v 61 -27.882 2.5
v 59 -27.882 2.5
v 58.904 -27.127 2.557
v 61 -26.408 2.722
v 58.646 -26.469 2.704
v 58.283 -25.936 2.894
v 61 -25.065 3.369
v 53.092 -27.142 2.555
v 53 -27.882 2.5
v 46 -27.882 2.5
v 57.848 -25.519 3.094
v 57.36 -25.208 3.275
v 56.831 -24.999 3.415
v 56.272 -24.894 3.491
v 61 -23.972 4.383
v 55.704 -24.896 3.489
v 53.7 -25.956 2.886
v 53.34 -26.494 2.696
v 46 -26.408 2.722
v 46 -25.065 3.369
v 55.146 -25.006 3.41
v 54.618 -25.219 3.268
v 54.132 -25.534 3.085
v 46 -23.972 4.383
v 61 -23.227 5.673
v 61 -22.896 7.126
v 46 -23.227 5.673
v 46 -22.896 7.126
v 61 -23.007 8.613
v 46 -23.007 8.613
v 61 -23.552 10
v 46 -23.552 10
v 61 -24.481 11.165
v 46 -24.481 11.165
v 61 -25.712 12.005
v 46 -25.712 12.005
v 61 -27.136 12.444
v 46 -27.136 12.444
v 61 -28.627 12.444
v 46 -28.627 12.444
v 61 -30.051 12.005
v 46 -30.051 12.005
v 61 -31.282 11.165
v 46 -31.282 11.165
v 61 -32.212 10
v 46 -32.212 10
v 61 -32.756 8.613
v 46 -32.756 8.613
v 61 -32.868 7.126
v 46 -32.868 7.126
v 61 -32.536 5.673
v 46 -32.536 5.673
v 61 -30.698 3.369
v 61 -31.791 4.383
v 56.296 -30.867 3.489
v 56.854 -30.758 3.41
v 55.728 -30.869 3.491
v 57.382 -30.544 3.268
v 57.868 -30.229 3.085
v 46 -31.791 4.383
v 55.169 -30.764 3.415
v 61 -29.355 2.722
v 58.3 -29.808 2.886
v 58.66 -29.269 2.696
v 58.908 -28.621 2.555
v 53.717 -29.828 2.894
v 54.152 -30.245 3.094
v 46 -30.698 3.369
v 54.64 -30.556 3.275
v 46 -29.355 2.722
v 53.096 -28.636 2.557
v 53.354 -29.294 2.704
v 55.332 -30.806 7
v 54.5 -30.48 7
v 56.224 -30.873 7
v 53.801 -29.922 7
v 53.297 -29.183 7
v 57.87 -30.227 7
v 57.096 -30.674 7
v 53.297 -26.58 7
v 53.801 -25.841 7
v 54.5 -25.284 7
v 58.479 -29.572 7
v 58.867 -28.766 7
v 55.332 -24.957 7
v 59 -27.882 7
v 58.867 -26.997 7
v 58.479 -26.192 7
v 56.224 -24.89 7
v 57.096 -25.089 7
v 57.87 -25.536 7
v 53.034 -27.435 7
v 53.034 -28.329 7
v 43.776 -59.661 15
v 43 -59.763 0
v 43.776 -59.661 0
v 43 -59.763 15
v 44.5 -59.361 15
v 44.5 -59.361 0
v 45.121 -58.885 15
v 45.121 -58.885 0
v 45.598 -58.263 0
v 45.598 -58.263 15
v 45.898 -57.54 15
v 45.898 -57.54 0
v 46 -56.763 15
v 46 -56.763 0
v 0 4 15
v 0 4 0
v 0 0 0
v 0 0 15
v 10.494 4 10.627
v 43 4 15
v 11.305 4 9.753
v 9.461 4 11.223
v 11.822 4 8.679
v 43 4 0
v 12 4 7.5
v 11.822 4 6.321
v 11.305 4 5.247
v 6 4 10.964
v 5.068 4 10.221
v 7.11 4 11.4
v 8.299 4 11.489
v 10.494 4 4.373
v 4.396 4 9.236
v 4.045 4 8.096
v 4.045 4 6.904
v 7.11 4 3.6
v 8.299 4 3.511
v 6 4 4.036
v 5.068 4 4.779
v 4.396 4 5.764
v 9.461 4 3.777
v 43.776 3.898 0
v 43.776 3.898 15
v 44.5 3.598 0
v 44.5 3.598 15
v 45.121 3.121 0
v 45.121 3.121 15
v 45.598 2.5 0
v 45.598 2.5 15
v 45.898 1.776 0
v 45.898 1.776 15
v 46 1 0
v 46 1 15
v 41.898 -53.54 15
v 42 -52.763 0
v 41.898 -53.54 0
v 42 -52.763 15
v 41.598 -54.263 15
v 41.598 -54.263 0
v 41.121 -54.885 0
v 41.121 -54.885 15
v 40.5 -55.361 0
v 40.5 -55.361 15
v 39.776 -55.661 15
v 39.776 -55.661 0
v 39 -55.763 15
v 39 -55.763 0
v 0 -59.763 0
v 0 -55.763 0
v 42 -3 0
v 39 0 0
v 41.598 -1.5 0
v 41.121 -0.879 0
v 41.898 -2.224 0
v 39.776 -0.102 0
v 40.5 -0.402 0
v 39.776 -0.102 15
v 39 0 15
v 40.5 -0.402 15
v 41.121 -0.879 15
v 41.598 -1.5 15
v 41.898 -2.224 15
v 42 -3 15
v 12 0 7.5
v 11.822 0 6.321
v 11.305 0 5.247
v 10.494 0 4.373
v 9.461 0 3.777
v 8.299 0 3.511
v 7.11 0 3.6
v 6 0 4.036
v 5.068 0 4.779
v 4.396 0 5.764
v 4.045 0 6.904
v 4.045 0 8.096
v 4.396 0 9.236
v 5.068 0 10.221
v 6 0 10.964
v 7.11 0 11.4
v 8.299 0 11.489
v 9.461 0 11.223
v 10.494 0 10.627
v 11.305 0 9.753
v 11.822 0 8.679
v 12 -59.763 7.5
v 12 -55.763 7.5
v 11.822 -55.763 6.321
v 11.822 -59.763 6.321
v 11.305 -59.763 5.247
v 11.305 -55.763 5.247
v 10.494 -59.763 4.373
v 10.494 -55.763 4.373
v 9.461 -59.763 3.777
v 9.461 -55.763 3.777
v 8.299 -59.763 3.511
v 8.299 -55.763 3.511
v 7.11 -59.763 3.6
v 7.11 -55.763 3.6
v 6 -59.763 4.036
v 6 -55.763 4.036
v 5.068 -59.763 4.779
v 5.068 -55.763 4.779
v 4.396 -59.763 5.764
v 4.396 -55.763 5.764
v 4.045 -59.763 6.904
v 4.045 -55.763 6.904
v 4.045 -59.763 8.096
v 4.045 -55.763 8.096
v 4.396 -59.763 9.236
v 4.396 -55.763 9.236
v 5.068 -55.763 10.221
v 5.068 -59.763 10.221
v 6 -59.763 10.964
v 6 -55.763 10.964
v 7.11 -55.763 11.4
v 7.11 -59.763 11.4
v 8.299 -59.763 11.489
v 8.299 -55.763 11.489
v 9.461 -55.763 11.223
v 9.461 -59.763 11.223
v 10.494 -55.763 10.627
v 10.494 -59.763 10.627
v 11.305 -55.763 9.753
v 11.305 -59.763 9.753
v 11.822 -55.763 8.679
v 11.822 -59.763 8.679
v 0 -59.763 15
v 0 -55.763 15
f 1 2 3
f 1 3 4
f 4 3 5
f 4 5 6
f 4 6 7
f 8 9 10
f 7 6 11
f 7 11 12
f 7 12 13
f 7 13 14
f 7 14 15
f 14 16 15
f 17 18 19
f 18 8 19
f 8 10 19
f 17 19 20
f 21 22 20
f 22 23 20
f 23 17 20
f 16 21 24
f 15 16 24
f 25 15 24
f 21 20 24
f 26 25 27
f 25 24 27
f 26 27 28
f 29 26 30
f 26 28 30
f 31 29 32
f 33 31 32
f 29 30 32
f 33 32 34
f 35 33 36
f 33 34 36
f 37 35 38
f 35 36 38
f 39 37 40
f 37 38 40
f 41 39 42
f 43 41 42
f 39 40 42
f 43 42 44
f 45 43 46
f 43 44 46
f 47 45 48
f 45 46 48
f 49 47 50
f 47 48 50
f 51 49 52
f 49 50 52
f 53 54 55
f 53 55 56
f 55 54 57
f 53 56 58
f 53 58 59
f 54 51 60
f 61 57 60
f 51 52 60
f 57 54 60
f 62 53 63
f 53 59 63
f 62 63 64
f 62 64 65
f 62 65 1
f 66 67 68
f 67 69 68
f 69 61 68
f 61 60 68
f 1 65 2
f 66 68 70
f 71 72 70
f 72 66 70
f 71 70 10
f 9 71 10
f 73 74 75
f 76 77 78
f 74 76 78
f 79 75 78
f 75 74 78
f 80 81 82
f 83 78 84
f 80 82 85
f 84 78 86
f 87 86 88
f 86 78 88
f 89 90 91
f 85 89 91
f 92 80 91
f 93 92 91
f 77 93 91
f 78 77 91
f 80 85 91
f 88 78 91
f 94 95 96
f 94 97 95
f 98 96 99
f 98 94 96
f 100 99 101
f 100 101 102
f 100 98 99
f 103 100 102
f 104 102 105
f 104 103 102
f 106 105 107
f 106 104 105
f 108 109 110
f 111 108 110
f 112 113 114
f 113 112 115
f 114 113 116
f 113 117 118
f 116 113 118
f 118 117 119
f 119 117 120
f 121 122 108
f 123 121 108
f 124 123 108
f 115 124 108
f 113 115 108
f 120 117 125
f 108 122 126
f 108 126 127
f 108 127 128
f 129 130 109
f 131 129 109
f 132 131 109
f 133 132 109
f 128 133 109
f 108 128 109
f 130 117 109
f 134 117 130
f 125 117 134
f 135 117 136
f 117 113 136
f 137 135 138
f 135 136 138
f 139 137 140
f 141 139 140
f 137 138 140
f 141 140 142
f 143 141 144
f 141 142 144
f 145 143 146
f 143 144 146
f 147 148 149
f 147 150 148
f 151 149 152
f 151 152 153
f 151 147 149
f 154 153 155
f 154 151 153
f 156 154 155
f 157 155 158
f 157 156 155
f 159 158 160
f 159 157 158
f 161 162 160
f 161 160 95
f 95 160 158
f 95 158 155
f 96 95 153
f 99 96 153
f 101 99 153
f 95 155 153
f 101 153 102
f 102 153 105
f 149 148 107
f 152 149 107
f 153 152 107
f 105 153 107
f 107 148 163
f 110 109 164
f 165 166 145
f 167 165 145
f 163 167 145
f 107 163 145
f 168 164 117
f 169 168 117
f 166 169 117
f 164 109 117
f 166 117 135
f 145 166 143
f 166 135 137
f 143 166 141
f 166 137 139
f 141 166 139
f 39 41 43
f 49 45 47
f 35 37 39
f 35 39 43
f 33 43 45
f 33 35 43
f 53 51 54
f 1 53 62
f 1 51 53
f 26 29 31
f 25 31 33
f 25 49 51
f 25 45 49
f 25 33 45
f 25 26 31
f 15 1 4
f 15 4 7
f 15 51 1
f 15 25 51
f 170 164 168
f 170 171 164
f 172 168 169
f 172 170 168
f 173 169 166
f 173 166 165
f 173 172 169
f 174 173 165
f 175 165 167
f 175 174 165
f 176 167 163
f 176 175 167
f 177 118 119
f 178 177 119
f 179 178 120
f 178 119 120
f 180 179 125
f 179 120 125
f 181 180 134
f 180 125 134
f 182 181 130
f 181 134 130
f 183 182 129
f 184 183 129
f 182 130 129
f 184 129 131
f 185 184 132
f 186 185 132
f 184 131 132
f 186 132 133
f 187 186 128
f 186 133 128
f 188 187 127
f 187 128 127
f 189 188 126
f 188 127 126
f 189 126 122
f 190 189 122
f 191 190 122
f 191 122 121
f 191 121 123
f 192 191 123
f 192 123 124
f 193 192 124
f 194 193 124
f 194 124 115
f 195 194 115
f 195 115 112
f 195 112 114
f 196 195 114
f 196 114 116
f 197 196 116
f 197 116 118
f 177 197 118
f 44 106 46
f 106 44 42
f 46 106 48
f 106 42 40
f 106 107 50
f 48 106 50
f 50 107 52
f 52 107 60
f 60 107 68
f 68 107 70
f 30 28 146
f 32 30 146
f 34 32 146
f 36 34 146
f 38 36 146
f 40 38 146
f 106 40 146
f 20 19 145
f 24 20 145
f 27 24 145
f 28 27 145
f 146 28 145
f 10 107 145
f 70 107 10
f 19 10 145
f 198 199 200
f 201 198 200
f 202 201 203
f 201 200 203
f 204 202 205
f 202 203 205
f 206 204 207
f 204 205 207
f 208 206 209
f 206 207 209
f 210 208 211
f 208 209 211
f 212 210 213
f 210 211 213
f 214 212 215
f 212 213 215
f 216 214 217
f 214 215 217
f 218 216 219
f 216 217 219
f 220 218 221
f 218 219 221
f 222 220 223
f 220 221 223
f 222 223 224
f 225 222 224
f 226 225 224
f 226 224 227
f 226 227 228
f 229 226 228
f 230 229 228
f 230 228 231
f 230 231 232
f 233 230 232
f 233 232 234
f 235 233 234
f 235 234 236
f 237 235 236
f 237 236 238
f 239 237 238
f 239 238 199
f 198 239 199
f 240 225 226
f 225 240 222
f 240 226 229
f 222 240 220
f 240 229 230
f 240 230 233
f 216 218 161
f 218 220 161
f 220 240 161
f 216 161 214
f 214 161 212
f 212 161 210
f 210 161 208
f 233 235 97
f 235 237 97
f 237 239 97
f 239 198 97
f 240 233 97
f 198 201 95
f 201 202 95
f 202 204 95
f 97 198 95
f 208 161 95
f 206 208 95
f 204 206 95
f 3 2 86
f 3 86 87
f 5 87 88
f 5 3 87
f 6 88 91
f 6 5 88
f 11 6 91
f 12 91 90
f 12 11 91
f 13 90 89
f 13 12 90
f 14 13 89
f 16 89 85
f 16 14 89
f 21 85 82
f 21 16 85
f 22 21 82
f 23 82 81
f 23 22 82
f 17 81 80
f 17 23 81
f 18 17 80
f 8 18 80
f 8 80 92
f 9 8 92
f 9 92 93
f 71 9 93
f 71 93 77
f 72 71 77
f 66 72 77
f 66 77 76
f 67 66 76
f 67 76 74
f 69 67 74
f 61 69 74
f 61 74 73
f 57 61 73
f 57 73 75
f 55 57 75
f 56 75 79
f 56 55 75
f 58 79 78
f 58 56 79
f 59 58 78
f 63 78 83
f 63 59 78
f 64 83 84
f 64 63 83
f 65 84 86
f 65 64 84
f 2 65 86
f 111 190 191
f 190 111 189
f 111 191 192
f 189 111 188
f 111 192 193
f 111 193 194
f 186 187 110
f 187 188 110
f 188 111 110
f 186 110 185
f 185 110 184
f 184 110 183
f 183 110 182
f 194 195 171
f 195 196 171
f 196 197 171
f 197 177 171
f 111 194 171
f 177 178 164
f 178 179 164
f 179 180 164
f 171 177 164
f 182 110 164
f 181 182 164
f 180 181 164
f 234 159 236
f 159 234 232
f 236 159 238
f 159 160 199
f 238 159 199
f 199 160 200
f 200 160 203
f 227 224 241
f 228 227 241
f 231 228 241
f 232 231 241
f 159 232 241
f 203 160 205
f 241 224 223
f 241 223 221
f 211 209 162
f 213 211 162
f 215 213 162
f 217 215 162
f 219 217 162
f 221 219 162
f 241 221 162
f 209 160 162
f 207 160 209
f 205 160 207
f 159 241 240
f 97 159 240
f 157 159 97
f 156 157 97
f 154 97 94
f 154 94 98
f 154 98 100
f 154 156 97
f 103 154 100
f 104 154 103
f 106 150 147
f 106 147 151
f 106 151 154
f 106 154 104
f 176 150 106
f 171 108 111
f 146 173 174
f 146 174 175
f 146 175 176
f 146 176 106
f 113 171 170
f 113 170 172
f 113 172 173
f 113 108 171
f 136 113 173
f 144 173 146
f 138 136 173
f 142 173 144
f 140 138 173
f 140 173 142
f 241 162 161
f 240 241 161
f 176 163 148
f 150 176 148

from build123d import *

# Parameters (mm, degrees)
BOSS_EXTRUDE1_DEPTH = 15
SKETCH2_R           = 4
CUT_EXTRUDE1_DEPTH  = 64.763255305
FILLET1_R           = 3
SKETCH4_R           = 5
BOSS_EXTRUDE2_DEPTH = 15
SKETCH5_R           = 3
CUT_EXTRUDE2_DEPTH  = 7


with BuildPart() as part:
    # Sketch1 → Boss-Extrude1 (new body)
    with BuildSketch(Plane.XY):
        Polygon((0, 0), (42, 0), (42, -55.763255305), (0, -55.763255305), (0, -59.763255305), (46, -59.763255305), (46, 4), (0, 4), align=None)
    extrude(amount=BOSS_EXTRUDE1_DEPTH)

    # Sketch2 → Cut-Extrude1 (cut, through all)
    with BuildSketch(Plane(origin=(0, 4, 0), x_dir=(1, 0, 0), z_dir=(0, 1, 0))):
        with Locations((8, -7.5)):
            Circle(SKETCH2_R)
    extrude(amount=-CUT_EXTRUDE1_DEPTH, mode=Mode.SUBTRACT)

    # Fillet1
    fillet1_edges = [part.edges().sort_by_distance(p)[0] for p in [
        (46, 4, 7.5),
        (46, -59.763255305, 7.5),
        (42, -55.763255305, 7.5),
        (42, 0, 7.5),
    ]]
    fillet(fillet1_edges, radius=FILLET1_R)

    # Sketch4 → Boss-Extrude2 (add)
    with BuildSketch(Plane(origin=(46, 0, 0), x_dir=(0, 0, -1), z_dir=(1, 0, 0))):
        with Locations((-7.5, -27.881627652)):
            Circle(SKETCH4_R)
    extrude(amount=BOSS_EXTRUDE2_DEPTH)

    # Sketch5 → Cut-Extrude2 (cut)
    with BuildSketch(Plane.XY):
        with Locations((56, -27.881627652)):
            Circle(SKETCH5_R)
    extrude(amount=CUT_EXTRUDE2_DEPTH, mode=Mode.SUBTRACT)


solid = part.part
